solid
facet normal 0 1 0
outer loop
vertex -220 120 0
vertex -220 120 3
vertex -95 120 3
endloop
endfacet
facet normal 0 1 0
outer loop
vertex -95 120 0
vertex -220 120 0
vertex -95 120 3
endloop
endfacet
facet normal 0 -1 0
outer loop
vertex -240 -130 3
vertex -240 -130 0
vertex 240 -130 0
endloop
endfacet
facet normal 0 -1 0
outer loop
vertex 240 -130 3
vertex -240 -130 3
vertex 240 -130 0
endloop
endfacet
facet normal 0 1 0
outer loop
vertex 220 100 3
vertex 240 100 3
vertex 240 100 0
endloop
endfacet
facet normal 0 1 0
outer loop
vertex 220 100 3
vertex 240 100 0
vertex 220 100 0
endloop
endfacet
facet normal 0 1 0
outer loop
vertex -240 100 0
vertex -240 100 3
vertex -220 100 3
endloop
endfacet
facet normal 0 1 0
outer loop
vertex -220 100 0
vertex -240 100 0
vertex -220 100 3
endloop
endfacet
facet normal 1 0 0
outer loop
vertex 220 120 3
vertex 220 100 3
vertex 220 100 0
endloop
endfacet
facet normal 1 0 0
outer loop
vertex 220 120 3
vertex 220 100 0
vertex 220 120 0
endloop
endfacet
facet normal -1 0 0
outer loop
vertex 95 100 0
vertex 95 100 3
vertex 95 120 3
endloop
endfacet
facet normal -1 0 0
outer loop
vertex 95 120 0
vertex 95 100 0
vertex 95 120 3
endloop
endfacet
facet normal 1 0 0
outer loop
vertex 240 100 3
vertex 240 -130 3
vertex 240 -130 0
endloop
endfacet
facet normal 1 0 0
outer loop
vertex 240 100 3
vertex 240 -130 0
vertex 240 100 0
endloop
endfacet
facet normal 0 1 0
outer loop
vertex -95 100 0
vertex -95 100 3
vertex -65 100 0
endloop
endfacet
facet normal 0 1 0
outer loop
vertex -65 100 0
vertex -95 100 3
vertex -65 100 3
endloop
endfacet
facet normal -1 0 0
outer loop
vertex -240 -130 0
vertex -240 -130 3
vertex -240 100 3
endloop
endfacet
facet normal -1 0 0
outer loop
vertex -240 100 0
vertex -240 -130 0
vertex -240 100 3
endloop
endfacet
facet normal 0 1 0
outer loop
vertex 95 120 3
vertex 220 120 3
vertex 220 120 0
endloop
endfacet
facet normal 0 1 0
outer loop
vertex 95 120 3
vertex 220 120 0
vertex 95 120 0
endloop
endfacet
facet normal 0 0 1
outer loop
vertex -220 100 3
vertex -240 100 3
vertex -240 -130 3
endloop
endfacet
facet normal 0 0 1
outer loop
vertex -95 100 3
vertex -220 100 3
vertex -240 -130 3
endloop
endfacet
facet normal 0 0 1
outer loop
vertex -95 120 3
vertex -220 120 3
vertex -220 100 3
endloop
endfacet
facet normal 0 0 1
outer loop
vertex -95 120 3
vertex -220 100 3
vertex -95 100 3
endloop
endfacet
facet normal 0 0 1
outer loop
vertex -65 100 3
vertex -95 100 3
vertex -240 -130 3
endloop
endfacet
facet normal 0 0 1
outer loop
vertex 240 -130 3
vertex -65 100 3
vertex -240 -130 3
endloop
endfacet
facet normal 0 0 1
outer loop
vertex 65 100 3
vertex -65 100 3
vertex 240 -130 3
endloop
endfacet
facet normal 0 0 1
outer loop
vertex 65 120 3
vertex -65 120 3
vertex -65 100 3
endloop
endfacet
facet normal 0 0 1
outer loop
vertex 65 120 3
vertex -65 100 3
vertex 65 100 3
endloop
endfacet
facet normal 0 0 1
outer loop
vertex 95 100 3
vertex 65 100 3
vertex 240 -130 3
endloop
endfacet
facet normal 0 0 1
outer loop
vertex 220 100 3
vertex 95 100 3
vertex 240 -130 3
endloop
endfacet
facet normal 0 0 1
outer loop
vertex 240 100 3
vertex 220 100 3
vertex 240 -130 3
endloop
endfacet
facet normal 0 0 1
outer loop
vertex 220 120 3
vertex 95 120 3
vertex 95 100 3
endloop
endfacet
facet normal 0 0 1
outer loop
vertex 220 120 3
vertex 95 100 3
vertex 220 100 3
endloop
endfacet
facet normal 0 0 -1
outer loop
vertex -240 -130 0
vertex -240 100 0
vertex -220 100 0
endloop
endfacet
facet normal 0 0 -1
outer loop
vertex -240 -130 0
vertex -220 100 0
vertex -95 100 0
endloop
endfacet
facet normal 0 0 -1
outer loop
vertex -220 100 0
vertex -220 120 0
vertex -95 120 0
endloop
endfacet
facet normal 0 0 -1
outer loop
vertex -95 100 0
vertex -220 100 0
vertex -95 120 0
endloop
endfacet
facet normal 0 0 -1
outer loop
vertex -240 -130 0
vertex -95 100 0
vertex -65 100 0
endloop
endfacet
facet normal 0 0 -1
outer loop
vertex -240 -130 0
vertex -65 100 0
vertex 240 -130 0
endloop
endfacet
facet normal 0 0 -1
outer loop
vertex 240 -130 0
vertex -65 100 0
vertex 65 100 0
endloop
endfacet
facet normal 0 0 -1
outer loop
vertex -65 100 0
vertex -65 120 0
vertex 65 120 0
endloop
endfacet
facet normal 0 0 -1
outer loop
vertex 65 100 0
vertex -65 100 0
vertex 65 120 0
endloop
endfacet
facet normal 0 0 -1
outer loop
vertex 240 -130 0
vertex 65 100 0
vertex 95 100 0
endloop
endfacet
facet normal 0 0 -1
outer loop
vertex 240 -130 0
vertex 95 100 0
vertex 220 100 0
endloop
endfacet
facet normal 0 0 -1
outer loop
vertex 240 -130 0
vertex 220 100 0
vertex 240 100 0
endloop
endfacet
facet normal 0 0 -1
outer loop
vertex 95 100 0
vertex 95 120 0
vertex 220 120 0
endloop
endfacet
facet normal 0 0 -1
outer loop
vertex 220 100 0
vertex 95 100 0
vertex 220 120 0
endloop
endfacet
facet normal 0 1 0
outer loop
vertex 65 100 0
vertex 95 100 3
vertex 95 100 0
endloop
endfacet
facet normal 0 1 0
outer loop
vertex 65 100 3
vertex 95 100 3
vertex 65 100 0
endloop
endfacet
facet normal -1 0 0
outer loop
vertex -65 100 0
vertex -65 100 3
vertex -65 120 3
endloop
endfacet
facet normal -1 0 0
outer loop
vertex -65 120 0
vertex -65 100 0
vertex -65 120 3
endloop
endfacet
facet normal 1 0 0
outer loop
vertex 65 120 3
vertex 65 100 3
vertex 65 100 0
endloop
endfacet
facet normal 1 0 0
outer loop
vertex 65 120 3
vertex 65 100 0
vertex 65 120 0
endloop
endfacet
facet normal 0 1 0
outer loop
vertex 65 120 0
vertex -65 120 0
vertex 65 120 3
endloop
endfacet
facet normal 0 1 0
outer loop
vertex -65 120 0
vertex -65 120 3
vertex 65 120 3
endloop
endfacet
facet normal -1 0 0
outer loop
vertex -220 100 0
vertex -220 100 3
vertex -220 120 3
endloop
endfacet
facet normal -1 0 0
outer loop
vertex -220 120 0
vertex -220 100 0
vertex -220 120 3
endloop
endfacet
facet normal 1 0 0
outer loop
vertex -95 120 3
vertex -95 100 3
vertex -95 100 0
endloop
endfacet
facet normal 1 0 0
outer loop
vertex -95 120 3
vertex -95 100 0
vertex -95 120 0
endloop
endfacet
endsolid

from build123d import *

# Parameters (mm, degrees)
CROQUIS1_W              = 500
CROQUIS1_H              = 260
SALIENTE_EXTRUIR1_DEPTH = 3
CROQUIS2_W              = 30
CROQUIS2_H              = 30
CORTAR_EXTRUIR1_DEPTH   = 4
CORTAR_EXTRUIR2_DEPTH   = 4


with BuildPart() as part:
    # Croquis1 → Saliente-Extruir1 (new body)
    with BuildSketch(Plane.XY):
        Rectangle(CROQUIS1_W, CROQUIS1_H)
    extrude(amount=SALIENTE_EXTRUIR1_DEPTH)

    # Croquis2 → Cortar-Extruir1 (cut, through all)
    with BuildSketch(Plane.XY.offset(3)):
        with Locations((-80, 115)):
            Rectangle(CROQUIS2_W, CROQUIS2_H)
        with Locations((-235, 115)):
            Rectangle(CROQUIS2_W, CROQUIS2_H)
    cortar_extruir1 = extrude(amount=-CORTAR_EXTRUIR1_DEPTH, mode=Mode.SUBTRACT)

    # Simetría1: Cortar-Extruir1 across plane
    add(cortar_extruir1.mirror(Plane(origin=(0, 0, 0), x_dir=(0, 0, 1), z_dir=(1, 0, 0))), mode=Mode.SUBTRACT)

    # Croquis3 → Cortar-Extruir2 (cut, through all)
    with BuildSketch(Plane.XY.offset(3)):
        Polygon((-250, -130), (-240, -130), (-240, 120), (0, 120), (0, 130), (-240, 130), (-250, 130), align=None)
    cortar_extruir2 = extrude(amount=-CORTAR_EXTRUIR2_DEPTH, mode=Mode.SUBTRACT)

    # Simetría2: Cortar-Extruir2 across plane
    add(cortar_extruir2.mirror(Plane(origin=(0, 0, 0), x_dir=(0, 0, 1), z_dir=(1, 0, 0))), mode=Mode.SUBTRACT)


solid = part.part
